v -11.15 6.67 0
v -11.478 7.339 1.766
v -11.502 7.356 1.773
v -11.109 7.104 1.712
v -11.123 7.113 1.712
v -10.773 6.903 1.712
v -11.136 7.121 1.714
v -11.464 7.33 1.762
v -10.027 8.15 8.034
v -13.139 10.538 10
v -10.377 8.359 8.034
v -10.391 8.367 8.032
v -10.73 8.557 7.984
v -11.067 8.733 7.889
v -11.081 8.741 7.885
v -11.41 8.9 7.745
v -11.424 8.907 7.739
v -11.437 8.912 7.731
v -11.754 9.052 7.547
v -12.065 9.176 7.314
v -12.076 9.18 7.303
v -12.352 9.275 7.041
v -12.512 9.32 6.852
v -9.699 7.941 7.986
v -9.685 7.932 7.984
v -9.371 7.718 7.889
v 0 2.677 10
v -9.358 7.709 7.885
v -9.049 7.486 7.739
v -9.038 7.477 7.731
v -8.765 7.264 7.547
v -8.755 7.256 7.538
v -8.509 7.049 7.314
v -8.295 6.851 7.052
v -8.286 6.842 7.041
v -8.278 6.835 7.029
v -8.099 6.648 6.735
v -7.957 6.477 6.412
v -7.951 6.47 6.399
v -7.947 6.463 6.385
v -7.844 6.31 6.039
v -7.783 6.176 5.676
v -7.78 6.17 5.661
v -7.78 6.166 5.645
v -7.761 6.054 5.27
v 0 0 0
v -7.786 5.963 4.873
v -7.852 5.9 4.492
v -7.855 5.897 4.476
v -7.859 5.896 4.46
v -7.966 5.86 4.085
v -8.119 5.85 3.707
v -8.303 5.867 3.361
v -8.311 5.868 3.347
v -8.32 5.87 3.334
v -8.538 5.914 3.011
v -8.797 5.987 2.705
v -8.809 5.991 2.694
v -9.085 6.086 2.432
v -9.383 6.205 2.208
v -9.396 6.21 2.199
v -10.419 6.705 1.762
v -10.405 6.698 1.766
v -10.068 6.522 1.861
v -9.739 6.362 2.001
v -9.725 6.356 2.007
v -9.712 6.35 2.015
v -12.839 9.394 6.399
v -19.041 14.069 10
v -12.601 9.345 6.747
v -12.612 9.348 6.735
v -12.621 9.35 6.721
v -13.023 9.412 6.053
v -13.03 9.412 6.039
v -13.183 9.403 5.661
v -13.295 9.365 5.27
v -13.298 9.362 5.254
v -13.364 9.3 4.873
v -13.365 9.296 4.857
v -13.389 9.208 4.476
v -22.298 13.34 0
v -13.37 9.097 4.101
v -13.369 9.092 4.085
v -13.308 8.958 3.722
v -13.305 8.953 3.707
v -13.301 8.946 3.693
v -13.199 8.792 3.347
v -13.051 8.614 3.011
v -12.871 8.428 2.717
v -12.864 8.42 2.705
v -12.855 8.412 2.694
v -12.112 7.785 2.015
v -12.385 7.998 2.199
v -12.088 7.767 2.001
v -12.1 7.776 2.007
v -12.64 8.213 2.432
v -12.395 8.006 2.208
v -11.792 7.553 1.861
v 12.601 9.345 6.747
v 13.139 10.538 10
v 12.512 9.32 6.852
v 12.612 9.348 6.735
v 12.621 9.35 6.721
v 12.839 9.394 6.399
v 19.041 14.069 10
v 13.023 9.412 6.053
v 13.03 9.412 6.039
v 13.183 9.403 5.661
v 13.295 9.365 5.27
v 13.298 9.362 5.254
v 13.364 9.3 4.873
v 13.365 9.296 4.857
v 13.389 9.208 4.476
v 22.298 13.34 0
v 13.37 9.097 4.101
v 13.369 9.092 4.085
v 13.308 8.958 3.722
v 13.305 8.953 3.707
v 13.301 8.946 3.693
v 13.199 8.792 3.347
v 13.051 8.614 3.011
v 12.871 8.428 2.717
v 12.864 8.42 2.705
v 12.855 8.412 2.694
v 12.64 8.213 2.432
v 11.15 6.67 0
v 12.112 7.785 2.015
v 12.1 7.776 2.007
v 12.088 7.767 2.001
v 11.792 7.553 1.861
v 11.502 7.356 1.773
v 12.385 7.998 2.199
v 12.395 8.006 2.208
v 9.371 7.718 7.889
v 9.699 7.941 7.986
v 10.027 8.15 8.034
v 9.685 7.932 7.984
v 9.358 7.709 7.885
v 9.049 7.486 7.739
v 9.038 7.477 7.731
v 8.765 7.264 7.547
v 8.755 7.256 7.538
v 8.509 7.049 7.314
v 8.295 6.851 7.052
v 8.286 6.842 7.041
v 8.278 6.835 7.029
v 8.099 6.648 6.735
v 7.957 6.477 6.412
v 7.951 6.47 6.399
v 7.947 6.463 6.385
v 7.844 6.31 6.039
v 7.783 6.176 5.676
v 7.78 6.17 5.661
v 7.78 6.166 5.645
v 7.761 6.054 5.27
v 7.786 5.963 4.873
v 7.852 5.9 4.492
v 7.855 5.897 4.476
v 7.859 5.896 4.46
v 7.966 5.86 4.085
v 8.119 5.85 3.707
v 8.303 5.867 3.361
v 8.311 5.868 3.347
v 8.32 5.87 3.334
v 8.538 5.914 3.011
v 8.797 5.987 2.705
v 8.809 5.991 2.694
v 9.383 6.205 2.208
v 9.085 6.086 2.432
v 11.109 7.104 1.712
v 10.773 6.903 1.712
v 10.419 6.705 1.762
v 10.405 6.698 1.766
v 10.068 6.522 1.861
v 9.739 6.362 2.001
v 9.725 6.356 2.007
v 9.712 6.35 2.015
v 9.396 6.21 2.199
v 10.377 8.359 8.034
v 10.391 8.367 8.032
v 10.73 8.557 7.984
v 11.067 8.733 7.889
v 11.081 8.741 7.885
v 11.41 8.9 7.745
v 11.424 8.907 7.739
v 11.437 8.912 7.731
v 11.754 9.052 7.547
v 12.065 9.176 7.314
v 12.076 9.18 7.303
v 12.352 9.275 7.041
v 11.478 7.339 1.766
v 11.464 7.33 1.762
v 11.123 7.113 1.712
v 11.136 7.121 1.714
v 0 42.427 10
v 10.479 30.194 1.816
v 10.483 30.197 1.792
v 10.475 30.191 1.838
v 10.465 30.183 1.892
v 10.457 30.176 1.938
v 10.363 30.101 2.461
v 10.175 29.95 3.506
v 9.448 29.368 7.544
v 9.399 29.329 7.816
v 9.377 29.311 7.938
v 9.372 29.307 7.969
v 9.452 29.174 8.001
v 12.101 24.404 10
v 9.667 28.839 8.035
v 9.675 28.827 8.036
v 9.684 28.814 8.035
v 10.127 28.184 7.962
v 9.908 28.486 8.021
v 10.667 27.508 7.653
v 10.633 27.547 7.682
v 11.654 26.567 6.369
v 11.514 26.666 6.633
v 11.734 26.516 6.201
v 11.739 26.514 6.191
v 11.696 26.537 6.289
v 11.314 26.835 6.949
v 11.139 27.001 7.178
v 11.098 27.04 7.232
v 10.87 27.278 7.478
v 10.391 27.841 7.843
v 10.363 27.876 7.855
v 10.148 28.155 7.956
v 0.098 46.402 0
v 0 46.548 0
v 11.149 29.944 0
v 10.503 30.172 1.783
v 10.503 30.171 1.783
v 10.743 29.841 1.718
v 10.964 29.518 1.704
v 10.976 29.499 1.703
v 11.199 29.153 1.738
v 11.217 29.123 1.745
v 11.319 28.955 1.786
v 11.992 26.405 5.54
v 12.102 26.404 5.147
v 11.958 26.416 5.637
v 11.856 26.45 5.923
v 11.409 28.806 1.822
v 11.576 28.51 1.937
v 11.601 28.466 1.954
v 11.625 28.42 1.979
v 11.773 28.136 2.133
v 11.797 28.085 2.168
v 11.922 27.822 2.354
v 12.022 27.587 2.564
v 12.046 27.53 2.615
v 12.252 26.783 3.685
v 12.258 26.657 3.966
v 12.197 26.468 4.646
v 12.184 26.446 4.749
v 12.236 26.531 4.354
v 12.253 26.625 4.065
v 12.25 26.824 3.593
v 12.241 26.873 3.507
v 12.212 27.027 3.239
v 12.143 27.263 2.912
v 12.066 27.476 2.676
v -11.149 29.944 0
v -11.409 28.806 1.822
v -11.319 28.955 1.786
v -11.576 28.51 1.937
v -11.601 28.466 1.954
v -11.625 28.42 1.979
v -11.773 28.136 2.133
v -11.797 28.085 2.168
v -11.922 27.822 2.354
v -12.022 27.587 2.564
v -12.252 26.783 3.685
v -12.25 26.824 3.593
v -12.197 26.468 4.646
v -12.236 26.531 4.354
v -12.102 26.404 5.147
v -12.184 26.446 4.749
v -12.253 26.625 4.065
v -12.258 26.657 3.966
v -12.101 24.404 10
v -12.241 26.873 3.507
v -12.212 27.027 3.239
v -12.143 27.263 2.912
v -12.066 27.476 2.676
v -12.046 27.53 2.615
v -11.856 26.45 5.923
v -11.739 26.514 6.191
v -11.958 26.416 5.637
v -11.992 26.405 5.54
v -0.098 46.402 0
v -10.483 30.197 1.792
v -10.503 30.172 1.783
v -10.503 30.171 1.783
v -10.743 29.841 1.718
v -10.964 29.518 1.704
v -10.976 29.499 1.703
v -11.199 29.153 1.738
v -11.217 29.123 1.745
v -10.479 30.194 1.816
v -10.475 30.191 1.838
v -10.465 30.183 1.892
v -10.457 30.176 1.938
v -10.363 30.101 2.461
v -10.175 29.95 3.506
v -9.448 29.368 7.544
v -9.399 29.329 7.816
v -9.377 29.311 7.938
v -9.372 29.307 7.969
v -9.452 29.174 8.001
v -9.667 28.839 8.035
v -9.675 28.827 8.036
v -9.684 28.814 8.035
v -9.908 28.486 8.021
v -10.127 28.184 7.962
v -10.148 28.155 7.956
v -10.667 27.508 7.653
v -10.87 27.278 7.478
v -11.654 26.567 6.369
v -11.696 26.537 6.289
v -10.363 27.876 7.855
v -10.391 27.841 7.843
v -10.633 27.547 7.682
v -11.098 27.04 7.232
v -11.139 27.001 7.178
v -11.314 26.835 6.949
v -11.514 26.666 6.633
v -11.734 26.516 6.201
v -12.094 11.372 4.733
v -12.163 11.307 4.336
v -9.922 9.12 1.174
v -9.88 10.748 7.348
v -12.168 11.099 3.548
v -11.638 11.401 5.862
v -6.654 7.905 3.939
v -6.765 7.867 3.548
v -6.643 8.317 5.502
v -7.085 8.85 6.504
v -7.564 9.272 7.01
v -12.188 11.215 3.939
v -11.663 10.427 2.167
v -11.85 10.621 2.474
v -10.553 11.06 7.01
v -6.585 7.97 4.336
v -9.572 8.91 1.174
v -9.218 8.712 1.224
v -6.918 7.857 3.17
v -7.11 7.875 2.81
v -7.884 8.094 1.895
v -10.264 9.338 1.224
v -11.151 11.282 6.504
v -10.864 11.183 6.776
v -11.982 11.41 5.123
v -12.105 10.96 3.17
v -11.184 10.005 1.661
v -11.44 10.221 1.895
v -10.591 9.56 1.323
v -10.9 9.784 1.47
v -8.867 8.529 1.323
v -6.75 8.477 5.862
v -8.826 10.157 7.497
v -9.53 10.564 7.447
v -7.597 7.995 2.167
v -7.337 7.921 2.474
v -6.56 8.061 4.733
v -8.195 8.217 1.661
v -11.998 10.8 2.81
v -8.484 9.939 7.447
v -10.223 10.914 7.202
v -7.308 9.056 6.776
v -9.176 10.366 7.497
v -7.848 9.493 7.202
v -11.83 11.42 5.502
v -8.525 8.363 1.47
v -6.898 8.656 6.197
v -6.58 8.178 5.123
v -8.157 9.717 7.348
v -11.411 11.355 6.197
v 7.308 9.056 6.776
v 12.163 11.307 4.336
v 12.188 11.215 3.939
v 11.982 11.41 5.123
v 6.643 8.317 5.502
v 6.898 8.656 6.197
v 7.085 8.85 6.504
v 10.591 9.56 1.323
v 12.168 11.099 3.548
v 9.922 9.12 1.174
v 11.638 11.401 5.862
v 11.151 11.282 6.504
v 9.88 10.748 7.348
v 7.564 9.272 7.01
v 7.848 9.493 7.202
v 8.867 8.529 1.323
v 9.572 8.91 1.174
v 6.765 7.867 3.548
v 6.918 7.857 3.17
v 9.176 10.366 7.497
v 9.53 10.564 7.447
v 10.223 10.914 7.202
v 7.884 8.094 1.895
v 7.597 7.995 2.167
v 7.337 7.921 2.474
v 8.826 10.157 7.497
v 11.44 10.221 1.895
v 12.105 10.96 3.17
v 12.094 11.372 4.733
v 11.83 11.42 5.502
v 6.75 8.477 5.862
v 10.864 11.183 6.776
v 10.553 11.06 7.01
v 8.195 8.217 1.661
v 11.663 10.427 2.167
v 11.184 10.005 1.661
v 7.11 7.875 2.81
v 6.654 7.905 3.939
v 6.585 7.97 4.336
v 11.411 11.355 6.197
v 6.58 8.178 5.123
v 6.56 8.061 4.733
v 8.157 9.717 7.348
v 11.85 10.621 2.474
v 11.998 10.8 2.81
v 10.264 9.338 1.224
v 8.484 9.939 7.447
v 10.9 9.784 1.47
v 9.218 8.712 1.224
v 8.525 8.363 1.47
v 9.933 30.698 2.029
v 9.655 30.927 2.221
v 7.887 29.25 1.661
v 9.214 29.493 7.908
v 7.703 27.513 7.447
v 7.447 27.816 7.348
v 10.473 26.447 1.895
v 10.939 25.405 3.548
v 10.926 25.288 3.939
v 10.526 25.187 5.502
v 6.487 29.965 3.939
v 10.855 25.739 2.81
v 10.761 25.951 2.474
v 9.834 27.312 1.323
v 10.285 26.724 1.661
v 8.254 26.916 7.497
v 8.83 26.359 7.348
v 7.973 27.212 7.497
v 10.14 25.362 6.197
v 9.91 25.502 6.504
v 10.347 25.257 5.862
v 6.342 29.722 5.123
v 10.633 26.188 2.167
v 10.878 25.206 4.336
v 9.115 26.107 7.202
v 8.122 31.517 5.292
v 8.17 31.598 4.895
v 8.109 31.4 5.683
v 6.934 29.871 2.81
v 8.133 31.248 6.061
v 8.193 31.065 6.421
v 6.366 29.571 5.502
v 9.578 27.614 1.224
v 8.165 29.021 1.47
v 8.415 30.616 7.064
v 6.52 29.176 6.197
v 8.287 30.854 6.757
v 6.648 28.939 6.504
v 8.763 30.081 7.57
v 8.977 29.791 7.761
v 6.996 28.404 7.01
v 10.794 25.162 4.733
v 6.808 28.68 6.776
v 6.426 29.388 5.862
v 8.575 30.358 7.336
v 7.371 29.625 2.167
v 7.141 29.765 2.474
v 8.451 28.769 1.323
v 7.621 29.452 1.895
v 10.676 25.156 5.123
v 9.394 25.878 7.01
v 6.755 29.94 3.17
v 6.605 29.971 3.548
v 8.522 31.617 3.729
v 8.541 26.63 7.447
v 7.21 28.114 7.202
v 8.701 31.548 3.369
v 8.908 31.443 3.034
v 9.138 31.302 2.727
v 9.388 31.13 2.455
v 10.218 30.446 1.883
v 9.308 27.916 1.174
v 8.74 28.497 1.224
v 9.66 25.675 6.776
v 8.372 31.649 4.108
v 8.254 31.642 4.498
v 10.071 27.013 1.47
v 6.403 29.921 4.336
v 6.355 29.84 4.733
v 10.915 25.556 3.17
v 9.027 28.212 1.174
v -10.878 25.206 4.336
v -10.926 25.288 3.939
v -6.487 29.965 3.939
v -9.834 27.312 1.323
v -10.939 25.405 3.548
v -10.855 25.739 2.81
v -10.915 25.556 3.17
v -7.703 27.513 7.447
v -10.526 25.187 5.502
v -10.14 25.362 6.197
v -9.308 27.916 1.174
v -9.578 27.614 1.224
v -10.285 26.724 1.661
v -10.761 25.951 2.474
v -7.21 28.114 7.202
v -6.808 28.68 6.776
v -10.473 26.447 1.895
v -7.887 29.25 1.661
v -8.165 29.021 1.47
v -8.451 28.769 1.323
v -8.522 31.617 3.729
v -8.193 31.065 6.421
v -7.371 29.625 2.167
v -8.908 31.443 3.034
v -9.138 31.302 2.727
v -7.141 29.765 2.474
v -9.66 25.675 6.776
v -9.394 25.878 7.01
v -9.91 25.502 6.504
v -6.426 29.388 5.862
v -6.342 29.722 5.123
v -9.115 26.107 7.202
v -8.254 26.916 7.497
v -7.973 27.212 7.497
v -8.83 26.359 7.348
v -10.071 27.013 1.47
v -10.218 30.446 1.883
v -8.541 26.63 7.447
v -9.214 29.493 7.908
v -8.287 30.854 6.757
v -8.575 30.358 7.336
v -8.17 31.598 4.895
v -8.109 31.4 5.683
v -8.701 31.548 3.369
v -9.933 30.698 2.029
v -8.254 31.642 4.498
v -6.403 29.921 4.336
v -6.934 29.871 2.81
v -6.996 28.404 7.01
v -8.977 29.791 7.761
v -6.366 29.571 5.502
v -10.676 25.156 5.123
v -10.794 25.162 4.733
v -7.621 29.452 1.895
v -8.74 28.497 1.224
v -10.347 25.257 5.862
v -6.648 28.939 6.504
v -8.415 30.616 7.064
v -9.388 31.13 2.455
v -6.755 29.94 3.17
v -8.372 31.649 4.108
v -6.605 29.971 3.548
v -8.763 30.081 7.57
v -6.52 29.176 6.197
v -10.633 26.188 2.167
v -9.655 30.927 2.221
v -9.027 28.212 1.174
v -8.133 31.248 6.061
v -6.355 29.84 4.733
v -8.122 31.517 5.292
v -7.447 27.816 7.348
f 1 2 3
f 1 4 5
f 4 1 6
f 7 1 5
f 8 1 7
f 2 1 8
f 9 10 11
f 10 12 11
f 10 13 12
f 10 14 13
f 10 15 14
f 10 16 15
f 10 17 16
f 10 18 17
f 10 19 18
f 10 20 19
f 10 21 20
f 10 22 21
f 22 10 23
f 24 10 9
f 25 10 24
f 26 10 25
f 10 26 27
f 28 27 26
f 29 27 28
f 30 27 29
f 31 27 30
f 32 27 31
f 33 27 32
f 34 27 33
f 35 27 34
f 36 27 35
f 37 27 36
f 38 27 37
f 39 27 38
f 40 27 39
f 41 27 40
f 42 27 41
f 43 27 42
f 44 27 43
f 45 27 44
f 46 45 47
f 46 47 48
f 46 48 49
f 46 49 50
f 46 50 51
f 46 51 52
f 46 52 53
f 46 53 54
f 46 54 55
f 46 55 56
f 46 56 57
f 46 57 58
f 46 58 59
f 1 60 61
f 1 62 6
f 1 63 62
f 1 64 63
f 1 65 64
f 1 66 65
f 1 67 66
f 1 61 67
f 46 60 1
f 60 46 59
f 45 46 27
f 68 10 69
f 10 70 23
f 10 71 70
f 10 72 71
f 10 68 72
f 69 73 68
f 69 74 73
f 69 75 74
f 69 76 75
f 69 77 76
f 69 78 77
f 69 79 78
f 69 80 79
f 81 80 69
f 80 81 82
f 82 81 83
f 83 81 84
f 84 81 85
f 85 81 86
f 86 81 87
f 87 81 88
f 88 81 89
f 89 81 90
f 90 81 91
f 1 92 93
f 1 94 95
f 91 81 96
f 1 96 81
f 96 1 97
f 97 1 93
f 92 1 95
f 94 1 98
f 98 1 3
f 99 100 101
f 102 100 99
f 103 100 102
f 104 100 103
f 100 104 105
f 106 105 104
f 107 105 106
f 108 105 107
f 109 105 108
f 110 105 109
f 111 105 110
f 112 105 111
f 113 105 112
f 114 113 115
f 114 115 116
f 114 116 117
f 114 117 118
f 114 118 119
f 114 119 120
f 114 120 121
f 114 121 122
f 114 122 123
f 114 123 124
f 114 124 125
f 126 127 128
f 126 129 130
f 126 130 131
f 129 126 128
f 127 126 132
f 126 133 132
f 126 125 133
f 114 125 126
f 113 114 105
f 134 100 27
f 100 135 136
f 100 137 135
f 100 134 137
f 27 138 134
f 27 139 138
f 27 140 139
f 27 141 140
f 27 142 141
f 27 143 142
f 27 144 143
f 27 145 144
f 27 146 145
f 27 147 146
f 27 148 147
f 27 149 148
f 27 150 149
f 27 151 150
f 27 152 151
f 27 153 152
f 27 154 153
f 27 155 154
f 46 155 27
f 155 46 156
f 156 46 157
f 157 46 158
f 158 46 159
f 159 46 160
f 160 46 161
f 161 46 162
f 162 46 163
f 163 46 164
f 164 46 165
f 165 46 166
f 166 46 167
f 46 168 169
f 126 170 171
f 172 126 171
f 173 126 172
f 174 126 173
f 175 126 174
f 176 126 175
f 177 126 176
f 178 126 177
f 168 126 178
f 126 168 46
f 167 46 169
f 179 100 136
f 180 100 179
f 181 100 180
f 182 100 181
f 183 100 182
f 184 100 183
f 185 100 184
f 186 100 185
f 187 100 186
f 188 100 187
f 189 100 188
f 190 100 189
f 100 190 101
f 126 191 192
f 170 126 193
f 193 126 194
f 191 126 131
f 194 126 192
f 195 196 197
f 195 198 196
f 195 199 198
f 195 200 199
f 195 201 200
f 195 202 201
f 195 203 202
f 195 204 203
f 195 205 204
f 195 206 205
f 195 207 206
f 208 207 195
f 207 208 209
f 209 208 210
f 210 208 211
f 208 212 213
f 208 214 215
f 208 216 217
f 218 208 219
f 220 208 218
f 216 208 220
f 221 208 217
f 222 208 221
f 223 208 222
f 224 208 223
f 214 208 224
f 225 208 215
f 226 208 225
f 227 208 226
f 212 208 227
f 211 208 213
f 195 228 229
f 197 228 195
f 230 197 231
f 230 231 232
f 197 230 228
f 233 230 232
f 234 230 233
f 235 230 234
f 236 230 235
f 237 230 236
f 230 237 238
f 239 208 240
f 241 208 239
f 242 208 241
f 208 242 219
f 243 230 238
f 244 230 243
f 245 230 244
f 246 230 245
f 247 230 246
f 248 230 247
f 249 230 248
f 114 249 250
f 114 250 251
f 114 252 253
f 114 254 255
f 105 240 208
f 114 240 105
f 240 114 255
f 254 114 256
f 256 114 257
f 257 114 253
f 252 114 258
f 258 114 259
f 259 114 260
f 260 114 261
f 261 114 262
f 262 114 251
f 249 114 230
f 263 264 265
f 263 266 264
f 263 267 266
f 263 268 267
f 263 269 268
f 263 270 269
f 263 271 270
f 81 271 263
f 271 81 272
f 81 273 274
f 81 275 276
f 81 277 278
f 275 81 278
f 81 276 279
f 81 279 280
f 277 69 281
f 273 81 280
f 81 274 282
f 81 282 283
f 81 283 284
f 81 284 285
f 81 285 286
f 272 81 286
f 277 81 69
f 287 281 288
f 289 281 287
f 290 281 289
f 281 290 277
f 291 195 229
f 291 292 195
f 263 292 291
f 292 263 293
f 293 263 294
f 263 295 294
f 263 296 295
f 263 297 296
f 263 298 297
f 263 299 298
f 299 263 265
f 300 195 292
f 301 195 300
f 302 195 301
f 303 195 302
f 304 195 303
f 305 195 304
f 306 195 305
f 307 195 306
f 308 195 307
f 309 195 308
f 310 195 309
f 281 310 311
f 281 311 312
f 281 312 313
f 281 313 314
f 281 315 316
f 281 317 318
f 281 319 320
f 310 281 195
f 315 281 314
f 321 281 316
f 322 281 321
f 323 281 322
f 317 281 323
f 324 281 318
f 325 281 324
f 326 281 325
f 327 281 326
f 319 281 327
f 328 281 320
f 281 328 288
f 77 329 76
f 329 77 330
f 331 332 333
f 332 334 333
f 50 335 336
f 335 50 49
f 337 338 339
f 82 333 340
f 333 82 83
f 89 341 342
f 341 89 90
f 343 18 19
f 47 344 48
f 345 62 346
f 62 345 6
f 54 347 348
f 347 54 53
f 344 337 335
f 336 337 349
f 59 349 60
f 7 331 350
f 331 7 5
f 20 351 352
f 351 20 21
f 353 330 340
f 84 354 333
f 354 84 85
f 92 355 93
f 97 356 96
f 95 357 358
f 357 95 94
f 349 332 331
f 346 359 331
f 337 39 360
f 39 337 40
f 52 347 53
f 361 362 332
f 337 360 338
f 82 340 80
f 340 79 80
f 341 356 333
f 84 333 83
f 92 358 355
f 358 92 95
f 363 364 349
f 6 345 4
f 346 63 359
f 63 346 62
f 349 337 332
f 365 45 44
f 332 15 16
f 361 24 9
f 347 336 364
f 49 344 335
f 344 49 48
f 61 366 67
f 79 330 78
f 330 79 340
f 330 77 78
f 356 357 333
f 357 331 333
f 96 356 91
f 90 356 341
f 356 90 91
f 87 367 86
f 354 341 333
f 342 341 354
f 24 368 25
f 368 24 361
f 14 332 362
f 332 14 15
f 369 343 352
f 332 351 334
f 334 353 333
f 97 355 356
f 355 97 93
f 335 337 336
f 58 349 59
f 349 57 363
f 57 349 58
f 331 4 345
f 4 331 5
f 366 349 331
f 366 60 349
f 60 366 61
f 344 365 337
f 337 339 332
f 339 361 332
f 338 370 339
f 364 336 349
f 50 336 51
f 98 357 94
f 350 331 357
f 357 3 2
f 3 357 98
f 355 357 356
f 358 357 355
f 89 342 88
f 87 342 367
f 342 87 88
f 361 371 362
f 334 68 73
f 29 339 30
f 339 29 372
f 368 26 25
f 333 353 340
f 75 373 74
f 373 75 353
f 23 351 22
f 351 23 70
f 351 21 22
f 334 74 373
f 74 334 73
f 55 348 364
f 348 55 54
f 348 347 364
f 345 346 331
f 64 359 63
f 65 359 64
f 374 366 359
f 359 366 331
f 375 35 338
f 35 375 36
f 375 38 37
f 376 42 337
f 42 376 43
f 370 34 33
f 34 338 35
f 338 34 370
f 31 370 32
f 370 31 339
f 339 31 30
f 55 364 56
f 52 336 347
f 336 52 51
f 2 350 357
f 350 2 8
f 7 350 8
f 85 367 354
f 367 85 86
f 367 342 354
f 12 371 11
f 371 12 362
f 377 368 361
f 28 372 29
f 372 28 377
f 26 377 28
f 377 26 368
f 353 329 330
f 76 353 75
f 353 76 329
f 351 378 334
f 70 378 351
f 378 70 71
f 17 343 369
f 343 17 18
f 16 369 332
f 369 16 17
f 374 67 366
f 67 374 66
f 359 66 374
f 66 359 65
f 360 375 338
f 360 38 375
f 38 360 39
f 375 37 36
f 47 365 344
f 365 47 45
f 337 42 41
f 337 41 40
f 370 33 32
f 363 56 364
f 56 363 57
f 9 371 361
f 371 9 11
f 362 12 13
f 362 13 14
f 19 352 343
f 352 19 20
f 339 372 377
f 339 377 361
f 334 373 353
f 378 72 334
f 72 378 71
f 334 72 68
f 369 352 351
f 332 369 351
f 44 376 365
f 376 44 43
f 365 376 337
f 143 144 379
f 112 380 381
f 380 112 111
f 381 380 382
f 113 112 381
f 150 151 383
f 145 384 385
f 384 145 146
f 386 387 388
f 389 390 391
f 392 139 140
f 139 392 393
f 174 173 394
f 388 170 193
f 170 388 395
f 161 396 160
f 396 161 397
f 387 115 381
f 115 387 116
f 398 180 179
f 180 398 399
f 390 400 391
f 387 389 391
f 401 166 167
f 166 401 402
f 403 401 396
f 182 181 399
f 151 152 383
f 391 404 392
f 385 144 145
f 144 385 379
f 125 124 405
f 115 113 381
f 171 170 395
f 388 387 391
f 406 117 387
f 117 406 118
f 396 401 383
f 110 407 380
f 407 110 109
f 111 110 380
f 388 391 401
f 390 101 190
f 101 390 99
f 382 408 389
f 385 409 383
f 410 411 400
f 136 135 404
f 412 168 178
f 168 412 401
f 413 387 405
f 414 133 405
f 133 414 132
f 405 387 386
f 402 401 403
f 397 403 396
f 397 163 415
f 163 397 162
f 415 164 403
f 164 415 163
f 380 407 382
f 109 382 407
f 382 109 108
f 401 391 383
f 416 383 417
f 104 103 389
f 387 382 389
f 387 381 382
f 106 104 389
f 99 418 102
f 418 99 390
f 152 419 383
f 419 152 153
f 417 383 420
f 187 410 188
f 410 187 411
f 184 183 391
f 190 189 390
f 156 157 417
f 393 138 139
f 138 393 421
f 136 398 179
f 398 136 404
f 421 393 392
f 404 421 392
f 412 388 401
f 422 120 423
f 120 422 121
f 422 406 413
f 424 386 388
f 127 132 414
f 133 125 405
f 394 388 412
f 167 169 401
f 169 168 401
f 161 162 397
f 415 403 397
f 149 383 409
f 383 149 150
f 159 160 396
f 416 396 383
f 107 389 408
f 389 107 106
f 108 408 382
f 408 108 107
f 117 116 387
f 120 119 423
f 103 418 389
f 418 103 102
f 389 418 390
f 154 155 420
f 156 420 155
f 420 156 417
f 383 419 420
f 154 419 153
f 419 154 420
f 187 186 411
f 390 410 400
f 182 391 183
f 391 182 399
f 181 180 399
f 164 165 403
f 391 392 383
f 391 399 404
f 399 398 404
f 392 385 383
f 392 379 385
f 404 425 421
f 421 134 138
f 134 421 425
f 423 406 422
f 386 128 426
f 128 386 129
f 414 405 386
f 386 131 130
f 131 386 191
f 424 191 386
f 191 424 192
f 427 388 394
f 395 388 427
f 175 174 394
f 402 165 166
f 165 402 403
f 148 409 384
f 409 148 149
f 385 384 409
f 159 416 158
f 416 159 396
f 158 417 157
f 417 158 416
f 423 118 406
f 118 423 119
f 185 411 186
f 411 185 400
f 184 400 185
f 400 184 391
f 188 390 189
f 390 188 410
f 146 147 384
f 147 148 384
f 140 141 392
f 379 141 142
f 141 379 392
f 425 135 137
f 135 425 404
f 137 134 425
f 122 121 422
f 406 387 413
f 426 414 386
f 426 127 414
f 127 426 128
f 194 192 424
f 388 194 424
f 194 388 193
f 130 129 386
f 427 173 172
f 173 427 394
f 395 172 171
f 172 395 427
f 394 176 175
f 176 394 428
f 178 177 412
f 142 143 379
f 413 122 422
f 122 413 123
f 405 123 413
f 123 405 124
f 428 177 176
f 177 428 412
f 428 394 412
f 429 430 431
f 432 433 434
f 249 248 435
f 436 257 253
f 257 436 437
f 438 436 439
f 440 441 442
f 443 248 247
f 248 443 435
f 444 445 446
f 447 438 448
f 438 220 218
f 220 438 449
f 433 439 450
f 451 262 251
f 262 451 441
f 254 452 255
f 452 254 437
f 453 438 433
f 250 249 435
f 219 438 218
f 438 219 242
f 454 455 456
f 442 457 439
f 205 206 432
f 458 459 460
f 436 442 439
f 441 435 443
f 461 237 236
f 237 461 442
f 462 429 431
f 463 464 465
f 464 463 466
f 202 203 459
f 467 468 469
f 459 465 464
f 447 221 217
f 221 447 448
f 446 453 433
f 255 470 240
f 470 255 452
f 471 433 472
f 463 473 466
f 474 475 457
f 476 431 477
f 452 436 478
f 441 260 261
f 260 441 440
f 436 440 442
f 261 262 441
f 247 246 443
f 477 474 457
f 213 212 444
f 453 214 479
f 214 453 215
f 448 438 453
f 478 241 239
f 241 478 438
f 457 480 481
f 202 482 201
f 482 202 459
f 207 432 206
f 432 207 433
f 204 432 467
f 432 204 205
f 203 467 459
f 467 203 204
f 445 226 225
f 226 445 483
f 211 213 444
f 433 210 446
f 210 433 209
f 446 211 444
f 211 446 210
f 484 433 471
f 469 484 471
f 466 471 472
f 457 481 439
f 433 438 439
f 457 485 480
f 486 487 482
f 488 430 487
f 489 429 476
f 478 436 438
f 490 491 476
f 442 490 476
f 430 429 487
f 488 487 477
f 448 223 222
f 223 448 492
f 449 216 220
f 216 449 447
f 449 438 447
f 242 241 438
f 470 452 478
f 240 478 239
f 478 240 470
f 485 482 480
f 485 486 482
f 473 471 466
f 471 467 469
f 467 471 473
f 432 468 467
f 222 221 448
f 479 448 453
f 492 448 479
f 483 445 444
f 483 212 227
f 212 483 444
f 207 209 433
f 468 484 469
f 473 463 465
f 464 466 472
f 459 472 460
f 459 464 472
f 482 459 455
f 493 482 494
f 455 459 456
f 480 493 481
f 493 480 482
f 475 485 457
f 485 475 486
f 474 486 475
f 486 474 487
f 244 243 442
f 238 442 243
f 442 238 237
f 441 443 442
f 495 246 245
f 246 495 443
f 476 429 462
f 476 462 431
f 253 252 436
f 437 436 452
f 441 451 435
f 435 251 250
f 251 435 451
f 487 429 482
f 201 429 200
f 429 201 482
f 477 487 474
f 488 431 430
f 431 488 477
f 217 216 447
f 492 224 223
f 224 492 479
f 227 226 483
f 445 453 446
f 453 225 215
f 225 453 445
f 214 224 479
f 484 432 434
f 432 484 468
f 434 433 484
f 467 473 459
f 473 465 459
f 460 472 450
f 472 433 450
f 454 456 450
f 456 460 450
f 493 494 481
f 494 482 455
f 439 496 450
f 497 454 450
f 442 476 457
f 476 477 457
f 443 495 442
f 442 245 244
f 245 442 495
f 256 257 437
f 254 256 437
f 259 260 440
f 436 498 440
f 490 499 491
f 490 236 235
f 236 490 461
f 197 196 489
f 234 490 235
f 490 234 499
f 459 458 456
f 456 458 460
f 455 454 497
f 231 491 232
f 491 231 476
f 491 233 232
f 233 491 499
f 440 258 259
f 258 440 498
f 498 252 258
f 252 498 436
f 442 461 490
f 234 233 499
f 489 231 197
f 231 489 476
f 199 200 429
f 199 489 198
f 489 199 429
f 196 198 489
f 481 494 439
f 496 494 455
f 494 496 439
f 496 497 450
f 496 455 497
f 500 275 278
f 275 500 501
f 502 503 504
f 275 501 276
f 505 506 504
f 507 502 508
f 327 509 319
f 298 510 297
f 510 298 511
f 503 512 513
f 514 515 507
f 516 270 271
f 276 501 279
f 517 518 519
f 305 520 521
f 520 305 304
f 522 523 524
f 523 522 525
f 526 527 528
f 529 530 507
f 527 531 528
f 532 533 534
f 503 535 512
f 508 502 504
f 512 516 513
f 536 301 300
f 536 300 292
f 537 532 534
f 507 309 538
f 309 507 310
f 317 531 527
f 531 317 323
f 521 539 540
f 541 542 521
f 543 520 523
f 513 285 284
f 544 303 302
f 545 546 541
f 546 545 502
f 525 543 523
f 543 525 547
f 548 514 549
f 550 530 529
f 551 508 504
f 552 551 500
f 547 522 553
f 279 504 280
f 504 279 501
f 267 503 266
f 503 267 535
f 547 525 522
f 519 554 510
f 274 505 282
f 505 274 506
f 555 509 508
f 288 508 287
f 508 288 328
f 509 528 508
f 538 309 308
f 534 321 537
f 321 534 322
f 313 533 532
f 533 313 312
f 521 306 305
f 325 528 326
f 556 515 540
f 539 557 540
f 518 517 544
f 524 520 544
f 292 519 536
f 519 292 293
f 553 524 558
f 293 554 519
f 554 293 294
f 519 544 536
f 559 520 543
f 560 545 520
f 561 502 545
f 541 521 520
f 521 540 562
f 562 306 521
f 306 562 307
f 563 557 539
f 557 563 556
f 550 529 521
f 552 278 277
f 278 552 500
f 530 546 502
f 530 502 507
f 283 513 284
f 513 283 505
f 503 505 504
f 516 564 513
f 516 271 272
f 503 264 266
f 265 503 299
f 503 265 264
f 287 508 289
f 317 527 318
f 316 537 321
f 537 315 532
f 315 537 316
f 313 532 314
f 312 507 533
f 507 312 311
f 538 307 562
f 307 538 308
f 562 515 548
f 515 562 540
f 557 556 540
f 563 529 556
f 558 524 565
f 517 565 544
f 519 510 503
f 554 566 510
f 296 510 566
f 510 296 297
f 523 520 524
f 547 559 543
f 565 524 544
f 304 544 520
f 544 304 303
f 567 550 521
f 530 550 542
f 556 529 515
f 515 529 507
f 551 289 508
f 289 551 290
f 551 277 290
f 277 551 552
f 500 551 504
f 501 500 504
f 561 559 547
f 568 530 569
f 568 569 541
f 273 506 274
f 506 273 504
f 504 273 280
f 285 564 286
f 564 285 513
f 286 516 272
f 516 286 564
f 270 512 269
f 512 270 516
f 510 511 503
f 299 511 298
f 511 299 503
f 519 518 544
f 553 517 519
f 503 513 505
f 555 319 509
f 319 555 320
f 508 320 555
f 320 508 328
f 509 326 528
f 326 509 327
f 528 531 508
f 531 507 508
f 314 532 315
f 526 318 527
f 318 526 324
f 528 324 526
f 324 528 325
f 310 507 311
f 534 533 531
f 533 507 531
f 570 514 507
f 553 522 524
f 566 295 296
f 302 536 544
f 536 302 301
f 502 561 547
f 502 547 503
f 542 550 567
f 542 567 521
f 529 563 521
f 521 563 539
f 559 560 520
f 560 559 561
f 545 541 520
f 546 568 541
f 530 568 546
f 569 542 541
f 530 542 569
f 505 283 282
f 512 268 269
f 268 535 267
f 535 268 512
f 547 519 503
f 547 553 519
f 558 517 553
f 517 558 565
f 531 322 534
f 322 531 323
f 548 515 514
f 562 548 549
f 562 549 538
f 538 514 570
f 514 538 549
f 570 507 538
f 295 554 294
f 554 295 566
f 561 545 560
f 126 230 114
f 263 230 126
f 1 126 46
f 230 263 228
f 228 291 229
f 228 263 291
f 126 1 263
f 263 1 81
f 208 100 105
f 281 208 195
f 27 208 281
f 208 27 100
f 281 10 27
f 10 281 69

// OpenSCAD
/*
	Deltoidal hexecontahedron with magnets tile, by eshira
	Dihedral angle: 154.12°
	
	60 tiles total are required.
	Use axially aligned magnets (4 per tile).
	Magnet mounting per tile MUST BE IDENTICAL!
	Following the following constraints:
		-Two parallel sides have the same pole facing outward
		-Two adjacent sides have the opposite pole facing outward
    See the diagram included for more help.

*/

$fn=50;

//User Defined Variables
longside = 40; //side length for longer side
thickness = 10; //how thick (z dimension) the tile is
magnetdepth = 2.5; //depth of the magnet holes; tailor this to suit your 3d printer
magnetdiam = 6.5; //diameter of the magnet holes; tailor this to suit your 3d printer

//Other Variables
dihedral = 154.12; //dihedral angle
phi = 118.22/2; // Half the angle between the two short sides
theta = 87.01; //Angle between long and short sides
shortside = longside*6/(7+sqrt(5)); //short side to long side ratio is 6:(7+√5)
ldiag = longside*sin(theta)/sin(phi); //Long diagonal of kite

//Main
tile();

//Modules
module tile() {
    difference(){
        mainbody();
        union(){
            chamfers();
            magnets();
        }
    }
}

module mainbody(){
	linear_extrude(height = thickness ) {
        polygon([[0,0],[-shortside*cos(90-phi),shortside*sin(90-phi)],[0,ldiag],[shortside*cos(90-phi),shortside*sin(90-phi)]]);
	}
}

module chamfers() {
	rotate([(180-dihedral)/2,0,phi+90]){
		linear_extrude(center=true, height=thickness*10) {
			polygon([[-5,0],[-5,thickness],[shortside+5,thickness],[shortside+5,0]]);
		}
	}
    
    mirror([1,0,0]){
        rotate([(180-dihedral)/2,0,phi+90]){
            linear_extrude(center=true, height=thickness*10) {
                polygon([[-5,0],[-5,thickness],[shortside+5,thickness],[shortside+5,0]]);
            }
        }
    }
    translate([0,ldiag,0]){
    	rotate([(180-dihedral)/2,0,-phi-theta+90]){
            linear_extrude(center=true, height=thickness*10) {
                polygon([[-5,0],[-5,thickness],[longside+5,thickness],[longside+5,0]]);
            }
        }
    }
    
    mirror([1,0,0]){
        translate([0,ldiag,0]){
            rotate([(180-dihedral)/2,0,-phi-theta+90]){
                linear_extrude(center=true, height=thickness*10) {
                    polygon([[-5,0],[-5,thickness],[longside+5,thickness],[longside+5,0]]);
                }
            }
        }
    }
}

module magnets() {
    extra=0.1;
    
    translate([-0.5*shortside*cos(90-phi),0.5*shortside*sin(90-phi),0]){
        rotate([180-dihedral/2,0,phi+90]){
            translate([0,thickness/2,-extra]) {
                linear_extrude(center=false, height=magnetdepth) {
                    circle(magnetdiam/2);
                }
            }
        }
    }
    
    mirror([1,0,0]){
        translate([-0.5*shortside*cos(90-phi),0.5*shortside*sin(90-phi),0]){
            rotate([180-dihedral/2,0,phi+90]){
                translate([0,thickness/2,-extra]) {
                    linear_extrude(center=false, height=magnetdepth) {
                        circle(magnetdiam/2);
                    }
                }
            }
        }
    }
    
    mirror([0,0,0]){
        translate([0.5*longside*cos(theta-(180-2*phi)/2),0.5*longside*sin(theta-(180-2*phi)/2)+shortside*sin(90-phi),0]){
            rotate([180-dihedral/2,0,-90+theta/2]){
                translate([0,thickness/2,-extra]) {
                    linear_extrude(center=false, height=magnetdepth) {
                        circle(magnetdiam/2);
                    }
                }
            }
        }
    }    
    
    mirror([1,0,0]){
        translate([0.5*longside*cos(theta-(180-2*phi)/2),0.5*longside*sin(theta-(180-2*phi)/2)+shortside*sin(90-phi),0]){
            rotate([180-dihedral/2,0,-90+theta/2]){
                translate([0,thickness/2,-extra]) {
                    linear_extrude(center=false, height=magnetdepth) {
                        circle(magnetdiam/2);
                    }
                }
            }
        }
    } 
}
